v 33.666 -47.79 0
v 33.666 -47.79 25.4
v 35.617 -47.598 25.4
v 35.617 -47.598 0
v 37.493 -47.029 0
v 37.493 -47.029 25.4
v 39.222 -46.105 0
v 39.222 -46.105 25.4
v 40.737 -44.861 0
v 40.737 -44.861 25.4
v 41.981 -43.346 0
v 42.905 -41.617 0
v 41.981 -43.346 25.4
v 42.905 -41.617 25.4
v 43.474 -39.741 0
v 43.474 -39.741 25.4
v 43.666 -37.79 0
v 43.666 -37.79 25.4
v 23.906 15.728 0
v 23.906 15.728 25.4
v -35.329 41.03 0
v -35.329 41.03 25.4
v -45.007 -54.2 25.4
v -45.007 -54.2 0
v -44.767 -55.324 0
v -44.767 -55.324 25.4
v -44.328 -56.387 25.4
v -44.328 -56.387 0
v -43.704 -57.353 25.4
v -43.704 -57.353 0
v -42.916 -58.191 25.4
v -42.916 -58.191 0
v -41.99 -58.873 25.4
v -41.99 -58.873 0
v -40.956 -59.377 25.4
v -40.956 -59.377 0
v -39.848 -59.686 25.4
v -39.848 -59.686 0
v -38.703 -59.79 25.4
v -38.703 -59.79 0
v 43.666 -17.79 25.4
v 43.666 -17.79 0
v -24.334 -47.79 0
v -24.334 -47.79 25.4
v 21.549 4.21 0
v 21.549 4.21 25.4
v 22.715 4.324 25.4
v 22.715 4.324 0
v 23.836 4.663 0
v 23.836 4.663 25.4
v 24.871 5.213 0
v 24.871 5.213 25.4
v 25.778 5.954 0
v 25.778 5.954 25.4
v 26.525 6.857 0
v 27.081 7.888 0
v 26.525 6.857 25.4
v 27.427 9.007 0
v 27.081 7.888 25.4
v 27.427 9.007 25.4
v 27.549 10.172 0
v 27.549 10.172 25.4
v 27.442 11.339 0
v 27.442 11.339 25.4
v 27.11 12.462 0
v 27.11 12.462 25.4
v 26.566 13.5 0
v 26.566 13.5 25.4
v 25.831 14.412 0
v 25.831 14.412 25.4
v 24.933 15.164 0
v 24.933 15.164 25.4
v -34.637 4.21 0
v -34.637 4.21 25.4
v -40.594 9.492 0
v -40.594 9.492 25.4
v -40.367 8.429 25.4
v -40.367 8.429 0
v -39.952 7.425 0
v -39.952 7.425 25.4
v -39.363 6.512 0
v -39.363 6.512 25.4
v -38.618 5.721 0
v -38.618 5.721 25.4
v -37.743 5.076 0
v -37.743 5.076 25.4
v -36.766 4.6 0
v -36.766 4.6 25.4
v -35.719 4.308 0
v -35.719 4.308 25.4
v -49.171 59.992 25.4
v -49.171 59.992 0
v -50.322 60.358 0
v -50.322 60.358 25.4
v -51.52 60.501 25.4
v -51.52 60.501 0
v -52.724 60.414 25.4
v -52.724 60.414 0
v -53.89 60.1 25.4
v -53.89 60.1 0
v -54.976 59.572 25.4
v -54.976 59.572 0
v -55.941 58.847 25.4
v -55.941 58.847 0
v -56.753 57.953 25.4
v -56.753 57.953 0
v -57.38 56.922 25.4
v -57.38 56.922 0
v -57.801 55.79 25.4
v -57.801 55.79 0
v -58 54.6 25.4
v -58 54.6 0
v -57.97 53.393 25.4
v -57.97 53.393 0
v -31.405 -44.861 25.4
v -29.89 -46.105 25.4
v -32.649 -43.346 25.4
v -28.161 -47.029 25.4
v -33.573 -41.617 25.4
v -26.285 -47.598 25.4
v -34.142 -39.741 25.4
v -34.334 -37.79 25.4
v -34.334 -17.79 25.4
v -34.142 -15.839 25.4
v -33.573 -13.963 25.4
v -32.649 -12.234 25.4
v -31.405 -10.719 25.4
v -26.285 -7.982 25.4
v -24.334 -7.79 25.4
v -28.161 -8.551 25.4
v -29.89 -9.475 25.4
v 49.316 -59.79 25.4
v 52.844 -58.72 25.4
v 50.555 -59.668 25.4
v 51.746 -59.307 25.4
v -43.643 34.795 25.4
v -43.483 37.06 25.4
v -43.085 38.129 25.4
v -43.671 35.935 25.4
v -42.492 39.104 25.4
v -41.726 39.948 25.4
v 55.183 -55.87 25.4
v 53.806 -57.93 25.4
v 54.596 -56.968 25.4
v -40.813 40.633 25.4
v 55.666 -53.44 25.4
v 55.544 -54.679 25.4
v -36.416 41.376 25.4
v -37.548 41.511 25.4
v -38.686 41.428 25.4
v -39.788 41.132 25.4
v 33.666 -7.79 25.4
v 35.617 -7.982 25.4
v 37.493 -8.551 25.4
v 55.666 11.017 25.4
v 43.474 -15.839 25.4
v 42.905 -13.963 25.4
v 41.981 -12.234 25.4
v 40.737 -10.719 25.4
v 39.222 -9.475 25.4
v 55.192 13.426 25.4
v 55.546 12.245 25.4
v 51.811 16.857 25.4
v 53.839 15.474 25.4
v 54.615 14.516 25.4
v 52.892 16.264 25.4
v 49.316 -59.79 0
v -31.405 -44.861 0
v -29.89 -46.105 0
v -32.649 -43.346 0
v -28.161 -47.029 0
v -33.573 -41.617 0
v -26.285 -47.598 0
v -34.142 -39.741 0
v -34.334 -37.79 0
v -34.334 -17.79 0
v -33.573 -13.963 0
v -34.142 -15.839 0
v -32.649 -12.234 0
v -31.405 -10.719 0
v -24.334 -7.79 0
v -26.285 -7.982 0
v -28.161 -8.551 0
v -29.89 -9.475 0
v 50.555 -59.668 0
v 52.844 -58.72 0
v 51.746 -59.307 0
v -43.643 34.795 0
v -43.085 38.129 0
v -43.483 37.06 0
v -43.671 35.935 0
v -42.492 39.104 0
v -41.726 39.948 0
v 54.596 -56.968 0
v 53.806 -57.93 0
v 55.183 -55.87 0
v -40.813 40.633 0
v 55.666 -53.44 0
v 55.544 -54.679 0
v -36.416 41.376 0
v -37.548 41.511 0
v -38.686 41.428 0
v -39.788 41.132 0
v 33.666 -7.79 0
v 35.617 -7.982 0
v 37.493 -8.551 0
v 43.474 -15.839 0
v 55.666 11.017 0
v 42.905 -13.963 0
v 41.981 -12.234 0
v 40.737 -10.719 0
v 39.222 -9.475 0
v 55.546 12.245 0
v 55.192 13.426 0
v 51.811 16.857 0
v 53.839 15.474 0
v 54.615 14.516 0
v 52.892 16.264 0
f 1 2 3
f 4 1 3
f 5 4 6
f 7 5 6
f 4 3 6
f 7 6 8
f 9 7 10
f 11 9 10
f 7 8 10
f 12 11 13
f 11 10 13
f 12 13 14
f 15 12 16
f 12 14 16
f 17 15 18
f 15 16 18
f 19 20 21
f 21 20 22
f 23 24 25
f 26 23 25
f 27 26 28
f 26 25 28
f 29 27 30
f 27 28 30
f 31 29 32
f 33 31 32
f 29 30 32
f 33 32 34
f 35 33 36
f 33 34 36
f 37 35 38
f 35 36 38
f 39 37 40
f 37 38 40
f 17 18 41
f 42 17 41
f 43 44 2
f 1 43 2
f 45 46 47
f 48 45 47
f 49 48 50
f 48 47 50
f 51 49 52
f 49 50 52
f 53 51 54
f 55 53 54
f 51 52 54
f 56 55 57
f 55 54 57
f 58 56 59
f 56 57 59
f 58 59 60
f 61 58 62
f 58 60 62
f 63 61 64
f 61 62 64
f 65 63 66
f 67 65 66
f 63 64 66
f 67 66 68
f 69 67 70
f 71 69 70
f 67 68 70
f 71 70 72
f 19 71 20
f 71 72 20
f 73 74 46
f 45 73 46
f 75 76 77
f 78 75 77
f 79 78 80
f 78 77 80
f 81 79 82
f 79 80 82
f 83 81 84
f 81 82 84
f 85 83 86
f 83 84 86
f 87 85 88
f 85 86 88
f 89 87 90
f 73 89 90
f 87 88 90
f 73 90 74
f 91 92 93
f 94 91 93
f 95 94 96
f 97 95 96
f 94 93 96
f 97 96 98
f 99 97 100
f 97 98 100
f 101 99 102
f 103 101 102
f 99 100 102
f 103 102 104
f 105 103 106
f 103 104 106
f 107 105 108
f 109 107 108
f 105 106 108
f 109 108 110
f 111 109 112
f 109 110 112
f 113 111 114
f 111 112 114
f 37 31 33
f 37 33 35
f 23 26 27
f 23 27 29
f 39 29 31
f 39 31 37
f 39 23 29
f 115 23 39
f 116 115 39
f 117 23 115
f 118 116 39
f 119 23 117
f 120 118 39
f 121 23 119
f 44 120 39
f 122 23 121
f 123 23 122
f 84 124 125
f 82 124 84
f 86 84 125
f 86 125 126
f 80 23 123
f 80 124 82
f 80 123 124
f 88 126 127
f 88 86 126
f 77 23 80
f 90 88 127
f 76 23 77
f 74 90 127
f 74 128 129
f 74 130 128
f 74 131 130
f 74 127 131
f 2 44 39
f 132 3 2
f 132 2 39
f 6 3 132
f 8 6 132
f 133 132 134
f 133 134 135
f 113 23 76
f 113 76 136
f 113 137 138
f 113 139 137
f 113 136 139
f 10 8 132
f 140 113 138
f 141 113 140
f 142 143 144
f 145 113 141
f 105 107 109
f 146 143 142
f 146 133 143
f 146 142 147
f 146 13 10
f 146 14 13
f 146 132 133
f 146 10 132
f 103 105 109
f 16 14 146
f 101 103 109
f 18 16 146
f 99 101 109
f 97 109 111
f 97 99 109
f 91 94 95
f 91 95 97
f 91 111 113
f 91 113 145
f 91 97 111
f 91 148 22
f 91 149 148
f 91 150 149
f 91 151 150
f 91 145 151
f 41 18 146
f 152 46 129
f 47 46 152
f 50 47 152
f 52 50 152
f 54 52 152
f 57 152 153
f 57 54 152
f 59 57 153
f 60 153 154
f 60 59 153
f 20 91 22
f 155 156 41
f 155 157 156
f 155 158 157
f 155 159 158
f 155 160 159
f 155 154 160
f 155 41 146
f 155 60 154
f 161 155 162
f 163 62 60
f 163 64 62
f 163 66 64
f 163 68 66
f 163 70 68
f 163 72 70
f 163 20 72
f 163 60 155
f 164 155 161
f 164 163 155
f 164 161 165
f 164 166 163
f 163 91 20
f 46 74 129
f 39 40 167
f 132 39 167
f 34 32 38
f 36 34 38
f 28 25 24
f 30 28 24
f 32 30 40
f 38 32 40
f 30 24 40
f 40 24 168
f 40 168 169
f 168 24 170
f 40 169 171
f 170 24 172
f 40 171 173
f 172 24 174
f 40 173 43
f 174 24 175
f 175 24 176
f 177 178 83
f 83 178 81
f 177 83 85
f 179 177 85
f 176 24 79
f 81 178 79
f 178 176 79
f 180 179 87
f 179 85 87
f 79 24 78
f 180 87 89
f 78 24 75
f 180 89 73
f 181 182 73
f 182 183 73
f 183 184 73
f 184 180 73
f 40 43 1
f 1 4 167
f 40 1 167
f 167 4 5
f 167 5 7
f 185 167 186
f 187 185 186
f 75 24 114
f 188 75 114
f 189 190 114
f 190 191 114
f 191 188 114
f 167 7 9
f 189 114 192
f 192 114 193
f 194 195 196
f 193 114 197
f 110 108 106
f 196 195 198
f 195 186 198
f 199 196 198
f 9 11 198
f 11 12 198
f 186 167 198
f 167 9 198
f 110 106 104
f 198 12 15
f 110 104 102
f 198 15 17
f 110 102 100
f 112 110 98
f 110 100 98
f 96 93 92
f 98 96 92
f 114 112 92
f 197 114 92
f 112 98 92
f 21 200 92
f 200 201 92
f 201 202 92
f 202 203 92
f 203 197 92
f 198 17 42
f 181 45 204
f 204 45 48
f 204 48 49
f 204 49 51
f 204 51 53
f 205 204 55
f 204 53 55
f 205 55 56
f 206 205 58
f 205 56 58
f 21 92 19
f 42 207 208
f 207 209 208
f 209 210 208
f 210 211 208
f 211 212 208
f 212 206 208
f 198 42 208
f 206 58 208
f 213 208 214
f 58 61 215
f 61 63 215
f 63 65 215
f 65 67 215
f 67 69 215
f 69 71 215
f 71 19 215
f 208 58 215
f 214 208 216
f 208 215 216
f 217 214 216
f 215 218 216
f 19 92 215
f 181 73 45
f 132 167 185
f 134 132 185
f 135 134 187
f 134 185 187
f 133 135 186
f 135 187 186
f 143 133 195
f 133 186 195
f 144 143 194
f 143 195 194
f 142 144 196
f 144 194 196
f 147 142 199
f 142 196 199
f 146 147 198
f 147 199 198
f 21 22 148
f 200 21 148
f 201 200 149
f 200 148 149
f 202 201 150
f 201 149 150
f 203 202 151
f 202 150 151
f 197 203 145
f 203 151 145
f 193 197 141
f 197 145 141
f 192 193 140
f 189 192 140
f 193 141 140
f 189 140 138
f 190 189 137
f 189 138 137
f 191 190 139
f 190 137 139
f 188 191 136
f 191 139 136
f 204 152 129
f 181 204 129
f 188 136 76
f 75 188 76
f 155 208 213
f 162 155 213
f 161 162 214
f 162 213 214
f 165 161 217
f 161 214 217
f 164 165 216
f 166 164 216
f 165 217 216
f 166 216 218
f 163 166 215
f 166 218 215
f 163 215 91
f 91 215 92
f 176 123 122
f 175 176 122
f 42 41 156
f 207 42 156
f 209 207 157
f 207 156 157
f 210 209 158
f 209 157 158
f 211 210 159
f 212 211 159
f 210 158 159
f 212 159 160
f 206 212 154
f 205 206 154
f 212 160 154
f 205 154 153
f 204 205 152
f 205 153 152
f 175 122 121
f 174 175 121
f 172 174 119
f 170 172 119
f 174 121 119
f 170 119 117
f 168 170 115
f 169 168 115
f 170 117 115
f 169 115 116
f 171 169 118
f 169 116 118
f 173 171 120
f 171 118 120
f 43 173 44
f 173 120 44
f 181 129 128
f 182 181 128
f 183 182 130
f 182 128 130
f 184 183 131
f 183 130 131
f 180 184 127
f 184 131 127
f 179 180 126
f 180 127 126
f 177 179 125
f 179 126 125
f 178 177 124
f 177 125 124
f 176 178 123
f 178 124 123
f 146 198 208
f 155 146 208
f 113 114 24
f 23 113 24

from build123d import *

# Parameters (mm, degrees)
F1_DEPTH = 25.4
F3_DEPTH = 25.4
F5_DEPTH = 25.4


with BuildPart() as f1:
    # F0 (on Top) → F1 (new body)
    with BuildSketch(Plane.XY):
        with BuildLine():
            ThreePointArc((-49.171314, 59.99193), (-55.475723, 59.232373), (-57.970132, 53.392816))
            Line((-57.970132, 53.392816), (-45.007356, -54.199724))
            ThreePointArc((-45.007356, -54.199724), (-42.915981, -58.191256), (-38.702947, -59.790168))
            Line((-38.702947, -59.790168), (49.316182, -59.790168))
            ThreePointArc((49.316182, -59.790168), (53.80631, -57.930296), (55.666182, -53.440168))
            Line((55.666182, -53.440168), (55.666182, 11.017219))
            ThreePointArc((55.666182, 11.017219), (54.615333, 14.516005), (51.810591, 16.856776))
            Line((51.810591, 16.856776), (-49.171314, 59.99193))
        make_face()
    extrude(amount=F1_DEPTH)

    # F2 (on face) → F3 (cut, through all)
    with BuildSketch(Plane.XY.offset(25.4)):
        with BuildLine():
            Line((33.666182, -7.790168), (-24.333818, -7.790168))
            ThreePointArc((-24.333818, -7.790168), (-31.404886, -10.7191), (-34.333818, -17.790168))
            Line((-34.333818, -17.790168), (-34.333818, -37.790168))
            ThreePointArc((-34.333818, -37.790168), (-31.404886, -44.861235), (-24.333818, -47.790168))
            Line((-24.333818, -47.790168), (33.666182, -47.790168))
            ThreePointArc((33.666182, -47.790168), (40.73725, -44.861235), (43.666182, -37.790168))
            Line((43.666182, -37.790168), (43.666182, -17.790168))
            ThreePointArc((43.666182, -17.790168), (40.73725, -10.7191), (33.666182, -7.790168))
        make_face()
    extrude(amount=-F3_DEPTH, mode=Mode.SUBTRACT)

    # F4 (on face) → F5 (cut, through all)
    with BuildSketch(Plane.XY.offset(25.4)):
        with BuildLine():
            Line((-34.637267, 4.209832), (21.548996, 4.209832))
            ThreePointArc((21.548996, 4.209832), (27.427183, 9.00695), (23.905918, 15.727524))
            Line((23.905918, 15.727524), (-35.328801, 41.030064))
            ThreePointArc((-35.328801, 41.030064), (-41.285723, 40.312373), (-43.642645, 34.794681))
            Line((-43.642645, 34.794681), (-40.594189, 9.492141))
            ThreePointArc((-40.594189, 9.492141), (-38.618087, 5.720615), (-34.637267, 4.209832))
        make_face()
    extrude(amount=-F5_DEPTH, mode=Mode.SUBTRACT)


solid = f1.part
